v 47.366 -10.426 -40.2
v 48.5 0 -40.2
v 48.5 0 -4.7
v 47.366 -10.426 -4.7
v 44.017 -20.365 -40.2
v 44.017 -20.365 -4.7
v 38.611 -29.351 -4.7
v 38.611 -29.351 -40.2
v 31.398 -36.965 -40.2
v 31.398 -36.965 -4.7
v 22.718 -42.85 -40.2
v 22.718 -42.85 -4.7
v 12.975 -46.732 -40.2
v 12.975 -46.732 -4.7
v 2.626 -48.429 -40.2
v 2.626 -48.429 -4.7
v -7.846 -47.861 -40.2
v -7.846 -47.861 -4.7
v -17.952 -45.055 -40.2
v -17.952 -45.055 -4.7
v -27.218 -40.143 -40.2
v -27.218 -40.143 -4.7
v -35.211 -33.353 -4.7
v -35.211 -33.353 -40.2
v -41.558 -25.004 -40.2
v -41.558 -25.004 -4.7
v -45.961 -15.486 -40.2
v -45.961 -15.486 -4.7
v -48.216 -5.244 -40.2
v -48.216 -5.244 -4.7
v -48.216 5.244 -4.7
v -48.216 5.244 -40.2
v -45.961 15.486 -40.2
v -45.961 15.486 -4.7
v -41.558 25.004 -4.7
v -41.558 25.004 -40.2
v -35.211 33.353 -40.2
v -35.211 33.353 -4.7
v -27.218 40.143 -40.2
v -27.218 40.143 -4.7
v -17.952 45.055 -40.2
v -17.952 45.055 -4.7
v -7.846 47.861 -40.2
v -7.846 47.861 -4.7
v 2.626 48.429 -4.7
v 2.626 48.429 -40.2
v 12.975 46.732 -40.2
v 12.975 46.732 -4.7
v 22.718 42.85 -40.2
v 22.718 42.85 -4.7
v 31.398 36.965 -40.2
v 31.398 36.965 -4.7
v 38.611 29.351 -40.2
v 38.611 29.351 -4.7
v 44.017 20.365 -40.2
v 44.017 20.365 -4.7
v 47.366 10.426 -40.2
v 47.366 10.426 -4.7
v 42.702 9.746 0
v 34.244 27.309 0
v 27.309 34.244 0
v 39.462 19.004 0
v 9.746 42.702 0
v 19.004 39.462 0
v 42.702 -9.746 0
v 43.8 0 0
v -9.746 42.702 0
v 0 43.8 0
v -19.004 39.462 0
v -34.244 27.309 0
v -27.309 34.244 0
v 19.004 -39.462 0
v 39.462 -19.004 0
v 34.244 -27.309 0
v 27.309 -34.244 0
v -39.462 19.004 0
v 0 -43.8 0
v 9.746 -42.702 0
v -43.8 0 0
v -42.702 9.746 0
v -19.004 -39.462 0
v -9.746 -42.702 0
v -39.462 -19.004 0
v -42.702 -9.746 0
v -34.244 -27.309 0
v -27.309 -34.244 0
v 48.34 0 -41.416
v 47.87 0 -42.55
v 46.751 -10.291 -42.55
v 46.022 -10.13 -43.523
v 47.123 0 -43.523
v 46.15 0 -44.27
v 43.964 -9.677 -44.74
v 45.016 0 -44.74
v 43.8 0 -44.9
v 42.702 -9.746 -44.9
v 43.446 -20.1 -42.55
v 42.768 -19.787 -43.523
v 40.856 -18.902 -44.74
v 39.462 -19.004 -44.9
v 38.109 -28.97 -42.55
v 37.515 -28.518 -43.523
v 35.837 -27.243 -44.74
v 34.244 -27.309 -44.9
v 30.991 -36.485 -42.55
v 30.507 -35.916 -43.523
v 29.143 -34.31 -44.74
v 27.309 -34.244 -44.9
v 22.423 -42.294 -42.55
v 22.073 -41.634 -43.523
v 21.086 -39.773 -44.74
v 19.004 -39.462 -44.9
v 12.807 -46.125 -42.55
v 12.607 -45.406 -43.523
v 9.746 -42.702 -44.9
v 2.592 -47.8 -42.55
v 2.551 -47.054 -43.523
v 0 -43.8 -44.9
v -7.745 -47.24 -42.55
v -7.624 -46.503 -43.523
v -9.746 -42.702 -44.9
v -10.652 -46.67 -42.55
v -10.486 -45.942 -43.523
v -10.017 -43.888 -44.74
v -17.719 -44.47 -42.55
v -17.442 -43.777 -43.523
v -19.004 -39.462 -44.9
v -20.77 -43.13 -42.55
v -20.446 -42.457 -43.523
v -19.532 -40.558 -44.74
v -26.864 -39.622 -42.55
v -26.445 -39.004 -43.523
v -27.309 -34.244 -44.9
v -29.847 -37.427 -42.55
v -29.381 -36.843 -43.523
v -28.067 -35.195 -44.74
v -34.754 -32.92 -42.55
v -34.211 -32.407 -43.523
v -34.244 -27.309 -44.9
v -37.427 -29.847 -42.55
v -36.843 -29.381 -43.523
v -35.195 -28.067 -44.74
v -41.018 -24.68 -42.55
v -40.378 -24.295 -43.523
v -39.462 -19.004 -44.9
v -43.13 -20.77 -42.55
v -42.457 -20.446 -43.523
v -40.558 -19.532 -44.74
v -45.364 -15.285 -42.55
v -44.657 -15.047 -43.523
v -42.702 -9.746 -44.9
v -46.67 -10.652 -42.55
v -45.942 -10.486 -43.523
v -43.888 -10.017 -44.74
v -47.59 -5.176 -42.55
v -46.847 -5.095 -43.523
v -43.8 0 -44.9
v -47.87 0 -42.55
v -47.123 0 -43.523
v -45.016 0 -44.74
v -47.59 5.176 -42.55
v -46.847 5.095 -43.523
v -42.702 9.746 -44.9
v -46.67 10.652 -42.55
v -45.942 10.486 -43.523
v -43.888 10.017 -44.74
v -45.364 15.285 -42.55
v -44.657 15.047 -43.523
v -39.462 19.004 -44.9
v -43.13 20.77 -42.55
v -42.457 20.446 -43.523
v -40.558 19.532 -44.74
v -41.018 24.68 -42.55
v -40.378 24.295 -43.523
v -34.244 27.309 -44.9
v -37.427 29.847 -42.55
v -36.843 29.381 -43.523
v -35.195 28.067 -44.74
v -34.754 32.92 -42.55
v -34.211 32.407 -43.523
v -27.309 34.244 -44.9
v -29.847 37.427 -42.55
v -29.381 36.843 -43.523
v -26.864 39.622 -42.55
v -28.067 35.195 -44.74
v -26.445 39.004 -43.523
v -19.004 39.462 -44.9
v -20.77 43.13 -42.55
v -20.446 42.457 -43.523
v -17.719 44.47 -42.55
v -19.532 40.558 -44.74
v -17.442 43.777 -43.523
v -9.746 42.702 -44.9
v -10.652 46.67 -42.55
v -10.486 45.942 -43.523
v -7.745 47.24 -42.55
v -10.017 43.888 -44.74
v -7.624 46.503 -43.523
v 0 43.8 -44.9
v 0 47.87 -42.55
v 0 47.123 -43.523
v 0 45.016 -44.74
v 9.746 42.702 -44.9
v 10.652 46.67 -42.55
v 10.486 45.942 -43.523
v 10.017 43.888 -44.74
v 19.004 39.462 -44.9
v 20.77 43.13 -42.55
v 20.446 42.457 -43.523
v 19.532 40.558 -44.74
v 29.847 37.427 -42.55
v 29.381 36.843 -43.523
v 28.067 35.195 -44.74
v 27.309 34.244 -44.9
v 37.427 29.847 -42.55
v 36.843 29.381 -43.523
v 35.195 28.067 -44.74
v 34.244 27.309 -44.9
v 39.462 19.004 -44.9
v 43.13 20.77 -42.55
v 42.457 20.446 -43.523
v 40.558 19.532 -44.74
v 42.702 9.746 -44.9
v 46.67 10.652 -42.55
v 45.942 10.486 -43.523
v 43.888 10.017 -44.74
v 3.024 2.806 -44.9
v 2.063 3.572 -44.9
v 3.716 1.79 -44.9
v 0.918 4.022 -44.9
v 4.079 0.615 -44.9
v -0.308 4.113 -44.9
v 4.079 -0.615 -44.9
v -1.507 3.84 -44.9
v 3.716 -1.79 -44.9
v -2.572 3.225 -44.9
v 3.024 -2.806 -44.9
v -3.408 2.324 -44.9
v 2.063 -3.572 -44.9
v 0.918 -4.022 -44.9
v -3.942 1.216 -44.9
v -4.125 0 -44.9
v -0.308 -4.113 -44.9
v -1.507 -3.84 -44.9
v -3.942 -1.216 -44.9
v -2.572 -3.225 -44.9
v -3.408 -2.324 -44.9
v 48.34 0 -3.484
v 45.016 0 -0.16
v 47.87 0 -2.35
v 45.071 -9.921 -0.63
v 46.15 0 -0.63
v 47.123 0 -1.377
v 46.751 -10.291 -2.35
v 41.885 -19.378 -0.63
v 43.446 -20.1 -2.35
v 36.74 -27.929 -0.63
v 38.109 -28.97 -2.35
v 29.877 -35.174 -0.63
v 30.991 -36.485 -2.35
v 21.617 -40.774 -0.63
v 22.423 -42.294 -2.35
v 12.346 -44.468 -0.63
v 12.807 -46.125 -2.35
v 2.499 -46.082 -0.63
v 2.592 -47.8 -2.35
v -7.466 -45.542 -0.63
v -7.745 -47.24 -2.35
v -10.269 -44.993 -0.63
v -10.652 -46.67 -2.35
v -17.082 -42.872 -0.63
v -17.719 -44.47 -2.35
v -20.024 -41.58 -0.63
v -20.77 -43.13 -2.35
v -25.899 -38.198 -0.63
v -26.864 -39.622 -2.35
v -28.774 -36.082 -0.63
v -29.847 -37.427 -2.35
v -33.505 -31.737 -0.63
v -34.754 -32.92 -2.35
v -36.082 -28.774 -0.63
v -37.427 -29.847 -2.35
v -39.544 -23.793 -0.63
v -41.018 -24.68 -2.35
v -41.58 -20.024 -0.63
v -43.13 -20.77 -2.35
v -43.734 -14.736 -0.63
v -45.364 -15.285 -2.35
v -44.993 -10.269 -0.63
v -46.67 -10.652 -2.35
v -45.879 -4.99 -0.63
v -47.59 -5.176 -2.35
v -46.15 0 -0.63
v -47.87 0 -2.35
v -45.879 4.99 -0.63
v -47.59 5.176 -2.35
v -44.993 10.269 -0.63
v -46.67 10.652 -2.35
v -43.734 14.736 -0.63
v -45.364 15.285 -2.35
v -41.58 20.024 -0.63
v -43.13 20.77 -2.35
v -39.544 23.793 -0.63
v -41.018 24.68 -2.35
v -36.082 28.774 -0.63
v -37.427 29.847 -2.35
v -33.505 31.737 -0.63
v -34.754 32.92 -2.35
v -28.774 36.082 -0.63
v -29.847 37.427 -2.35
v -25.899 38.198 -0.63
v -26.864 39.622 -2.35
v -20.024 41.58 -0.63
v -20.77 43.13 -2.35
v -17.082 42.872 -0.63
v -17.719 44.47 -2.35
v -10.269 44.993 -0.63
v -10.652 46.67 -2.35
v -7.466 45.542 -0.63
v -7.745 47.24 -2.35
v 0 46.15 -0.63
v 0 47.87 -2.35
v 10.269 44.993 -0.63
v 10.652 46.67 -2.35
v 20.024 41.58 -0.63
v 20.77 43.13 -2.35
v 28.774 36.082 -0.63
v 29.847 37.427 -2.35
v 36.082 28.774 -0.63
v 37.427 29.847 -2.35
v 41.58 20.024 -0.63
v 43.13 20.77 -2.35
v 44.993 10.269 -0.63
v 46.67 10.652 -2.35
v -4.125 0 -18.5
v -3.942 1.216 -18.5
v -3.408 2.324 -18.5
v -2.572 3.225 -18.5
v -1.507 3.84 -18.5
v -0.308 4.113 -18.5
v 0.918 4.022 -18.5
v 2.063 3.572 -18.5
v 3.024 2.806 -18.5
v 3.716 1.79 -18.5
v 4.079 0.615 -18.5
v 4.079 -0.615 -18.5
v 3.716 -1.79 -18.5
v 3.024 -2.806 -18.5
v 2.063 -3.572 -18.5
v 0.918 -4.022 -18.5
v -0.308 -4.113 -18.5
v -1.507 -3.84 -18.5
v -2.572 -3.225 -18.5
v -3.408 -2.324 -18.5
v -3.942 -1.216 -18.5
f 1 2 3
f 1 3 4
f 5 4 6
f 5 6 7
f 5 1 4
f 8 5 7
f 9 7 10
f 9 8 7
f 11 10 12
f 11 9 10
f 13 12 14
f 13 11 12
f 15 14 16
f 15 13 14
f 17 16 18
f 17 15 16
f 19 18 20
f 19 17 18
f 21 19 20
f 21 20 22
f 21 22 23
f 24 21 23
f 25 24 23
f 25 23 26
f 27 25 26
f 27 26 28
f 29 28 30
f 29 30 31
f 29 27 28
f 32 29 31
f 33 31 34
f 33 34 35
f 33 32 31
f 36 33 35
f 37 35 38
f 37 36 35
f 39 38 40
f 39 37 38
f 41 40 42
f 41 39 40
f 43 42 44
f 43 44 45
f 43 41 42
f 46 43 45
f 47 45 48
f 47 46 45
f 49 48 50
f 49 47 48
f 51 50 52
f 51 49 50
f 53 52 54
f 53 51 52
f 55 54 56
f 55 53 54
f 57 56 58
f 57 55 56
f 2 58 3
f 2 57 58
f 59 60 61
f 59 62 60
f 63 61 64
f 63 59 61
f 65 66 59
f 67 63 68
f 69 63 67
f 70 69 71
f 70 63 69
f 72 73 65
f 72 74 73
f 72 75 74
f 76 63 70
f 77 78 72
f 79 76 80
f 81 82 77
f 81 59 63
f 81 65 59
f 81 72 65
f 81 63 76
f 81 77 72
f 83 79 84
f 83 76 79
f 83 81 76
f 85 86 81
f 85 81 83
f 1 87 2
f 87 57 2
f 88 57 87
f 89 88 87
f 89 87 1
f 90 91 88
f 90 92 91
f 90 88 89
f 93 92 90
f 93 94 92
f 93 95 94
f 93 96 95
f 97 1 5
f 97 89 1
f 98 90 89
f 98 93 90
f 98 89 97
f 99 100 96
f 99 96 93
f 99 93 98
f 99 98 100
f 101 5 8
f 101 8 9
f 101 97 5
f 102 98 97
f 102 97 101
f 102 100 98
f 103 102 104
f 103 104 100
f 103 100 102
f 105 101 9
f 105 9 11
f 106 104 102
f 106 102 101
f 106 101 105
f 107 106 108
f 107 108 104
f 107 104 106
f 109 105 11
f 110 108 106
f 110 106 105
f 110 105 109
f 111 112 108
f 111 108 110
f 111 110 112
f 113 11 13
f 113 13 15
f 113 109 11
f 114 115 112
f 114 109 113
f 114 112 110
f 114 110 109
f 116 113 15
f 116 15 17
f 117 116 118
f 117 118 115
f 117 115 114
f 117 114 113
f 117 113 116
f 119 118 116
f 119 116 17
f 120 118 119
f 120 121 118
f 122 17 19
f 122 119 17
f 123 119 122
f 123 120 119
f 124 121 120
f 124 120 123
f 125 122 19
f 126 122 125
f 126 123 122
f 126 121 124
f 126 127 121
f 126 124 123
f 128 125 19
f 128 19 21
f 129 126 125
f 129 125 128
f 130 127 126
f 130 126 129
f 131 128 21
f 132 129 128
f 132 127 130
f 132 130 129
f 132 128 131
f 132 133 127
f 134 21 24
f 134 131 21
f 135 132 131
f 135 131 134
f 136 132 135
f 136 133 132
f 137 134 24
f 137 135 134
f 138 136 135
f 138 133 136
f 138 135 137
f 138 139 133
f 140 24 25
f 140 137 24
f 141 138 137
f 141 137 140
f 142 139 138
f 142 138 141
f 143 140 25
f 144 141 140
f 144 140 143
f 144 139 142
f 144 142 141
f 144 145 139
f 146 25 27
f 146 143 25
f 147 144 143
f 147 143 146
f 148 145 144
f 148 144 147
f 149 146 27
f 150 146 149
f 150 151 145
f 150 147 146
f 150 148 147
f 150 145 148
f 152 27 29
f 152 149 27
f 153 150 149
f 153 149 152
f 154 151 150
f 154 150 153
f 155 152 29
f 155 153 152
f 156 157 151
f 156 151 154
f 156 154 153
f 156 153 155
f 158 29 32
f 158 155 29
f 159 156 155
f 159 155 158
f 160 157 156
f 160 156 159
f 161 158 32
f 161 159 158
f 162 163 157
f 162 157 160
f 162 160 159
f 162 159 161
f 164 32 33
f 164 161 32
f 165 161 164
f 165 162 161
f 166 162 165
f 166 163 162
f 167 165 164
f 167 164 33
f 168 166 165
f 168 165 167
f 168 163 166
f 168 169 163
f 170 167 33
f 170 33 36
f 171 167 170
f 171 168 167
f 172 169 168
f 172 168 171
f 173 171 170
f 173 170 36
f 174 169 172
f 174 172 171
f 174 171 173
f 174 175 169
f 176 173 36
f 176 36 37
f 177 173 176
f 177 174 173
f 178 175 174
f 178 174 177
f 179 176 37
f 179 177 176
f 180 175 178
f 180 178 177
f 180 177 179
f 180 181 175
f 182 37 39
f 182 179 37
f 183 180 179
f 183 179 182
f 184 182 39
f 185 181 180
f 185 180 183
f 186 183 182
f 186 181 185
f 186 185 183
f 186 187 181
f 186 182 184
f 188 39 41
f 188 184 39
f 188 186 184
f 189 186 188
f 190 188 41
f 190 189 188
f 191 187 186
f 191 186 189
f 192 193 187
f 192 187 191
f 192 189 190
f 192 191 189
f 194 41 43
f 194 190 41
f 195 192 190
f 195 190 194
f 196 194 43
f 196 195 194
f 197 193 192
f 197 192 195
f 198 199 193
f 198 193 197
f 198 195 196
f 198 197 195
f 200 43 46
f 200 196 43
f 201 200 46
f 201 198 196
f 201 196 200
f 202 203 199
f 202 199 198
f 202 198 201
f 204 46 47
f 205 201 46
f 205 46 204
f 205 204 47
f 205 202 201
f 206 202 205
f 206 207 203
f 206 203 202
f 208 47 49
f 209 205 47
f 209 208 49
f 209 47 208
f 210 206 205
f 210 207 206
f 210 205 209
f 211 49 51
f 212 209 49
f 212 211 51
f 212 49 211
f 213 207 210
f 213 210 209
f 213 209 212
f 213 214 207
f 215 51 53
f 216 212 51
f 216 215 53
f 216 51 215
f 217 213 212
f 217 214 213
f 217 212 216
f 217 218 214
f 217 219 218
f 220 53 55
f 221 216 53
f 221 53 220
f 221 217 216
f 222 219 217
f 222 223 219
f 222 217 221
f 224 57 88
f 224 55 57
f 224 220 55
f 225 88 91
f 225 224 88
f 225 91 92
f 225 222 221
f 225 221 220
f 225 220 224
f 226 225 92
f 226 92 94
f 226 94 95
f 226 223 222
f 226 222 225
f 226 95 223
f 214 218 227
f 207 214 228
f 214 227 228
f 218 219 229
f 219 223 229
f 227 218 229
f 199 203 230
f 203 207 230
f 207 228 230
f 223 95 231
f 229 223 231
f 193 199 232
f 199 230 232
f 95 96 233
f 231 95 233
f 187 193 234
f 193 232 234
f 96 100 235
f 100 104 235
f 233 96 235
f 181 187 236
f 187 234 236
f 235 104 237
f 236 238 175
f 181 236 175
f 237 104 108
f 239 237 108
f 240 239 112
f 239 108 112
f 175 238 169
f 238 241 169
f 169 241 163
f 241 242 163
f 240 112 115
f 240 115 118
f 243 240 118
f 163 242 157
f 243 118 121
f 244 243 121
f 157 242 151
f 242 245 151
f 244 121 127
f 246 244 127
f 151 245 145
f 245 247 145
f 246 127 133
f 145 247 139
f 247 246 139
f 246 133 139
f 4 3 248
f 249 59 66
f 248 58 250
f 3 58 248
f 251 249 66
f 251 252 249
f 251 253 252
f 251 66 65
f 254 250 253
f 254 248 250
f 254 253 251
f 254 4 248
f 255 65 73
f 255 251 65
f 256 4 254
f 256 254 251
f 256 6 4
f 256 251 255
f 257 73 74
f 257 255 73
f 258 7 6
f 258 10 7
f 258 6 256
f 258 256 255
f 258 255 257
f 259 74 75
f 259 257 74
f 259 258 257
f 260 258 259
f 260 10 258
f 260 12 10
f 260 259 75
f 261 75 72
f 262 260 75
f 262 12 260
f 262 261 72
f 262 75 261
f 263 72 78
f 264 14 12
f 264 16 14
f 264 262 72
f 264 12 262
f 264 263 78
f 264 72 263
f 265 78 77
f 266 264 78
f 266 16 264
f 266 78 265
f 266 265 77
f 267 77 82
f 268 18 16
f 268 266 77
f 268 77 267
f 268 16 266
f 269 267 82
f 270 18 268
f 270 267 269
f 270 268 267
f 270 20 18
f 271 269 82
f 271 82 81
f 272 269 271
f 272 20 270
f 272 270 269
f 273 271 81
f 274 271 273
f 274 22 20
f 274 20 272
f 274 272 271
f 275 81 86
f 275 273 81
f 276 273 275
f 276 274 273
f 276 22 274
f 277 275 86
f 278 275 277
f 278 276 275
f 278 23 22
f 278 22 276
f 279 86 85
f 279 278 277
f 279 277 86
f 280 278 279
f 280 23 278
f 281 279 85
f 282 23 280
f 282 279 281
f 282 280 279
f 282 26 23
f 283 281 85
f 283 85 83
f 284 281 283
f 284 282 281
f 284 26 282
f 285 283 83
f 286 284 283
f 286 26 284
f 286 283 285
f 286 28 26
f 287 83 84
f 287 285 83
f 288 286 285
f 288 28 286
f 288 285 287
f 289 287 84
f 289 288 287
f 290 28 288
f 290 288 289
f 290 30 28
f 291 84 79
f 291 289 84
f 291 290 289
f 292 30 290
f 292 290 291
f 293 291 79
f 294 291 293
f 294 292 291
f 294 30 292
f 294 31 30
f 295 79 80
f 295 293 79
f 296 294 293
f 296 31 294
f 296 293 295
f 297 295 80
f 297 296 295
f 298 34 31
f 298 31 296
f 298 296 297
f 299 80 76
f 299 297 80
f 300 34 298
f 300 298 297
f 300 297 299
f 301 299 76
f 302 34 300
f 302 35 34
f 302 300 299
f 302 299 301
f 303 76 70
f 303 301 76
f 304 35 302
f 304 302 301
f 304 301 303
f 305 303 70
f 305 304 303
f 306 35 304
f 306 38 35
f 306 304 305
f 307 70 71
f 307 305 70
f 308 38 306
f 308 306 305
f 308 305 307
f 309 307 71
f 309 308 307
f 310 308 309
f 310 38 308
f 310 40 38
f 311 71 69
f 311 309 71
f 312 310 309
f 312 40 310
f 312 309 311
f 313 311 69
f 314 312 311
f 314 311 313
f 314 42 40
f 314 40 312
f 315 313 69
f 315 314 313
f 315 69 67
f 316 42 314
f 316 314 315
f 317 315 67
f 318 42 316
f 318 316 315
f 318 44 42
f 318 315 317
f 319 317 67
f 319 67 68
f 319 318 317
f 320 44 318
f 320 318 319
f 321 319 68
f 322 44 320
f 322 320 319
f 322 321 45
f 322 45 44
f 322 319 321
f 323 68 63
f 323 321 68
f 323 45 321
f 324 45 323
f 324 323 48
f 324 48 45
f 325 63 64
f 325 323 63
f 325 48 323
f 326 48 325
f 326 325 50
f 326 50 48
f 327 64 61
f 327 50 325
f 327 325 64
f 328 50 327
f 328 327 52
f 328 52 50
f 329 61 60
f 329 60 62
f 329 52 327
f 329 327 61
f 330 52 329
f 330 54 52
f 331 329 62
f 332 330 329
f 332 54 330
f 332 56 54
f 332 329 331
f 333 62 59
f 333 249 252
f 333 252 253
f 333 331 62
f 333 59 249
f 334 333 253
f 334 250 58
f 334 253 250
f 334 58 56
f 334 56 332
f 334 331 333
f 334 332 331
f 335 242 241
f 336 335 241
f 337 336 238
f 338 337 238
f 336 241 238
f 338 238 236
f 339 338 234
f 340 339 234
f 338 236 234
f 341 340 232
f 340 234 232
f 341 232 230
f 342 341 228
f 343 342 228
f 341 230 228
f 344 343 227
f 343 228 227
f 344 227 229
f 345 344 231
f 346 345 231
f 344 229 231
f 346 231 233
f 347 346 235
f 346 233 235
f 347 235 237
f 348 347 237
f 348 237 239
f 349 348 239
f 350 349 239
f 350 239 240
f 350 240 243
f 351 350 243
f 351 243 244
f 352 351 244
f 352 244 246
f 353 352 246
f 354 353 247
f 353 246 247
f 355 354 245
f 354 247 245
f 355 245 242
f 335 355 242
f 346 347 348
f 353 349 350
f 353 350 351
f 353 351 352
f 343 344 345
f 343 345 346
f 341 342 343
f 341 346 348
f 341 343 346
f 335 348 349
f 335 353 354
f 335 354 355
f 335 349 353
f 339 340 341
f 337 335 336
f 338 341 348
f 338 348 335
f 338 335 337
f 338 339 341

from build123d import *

# Parameters (mm, degrees)
SKETCH1_W          = 48.5
SKETCH1_H          = 44.9
SKETCH2_R          = 4.125
CUT_EXTRUDE1_DEPTH = 26.4
FILLET1_R          = 4.7


with BuildPart() as part:
    # Sketch1 → Revolve1 (revolve)
    with BuildSketch(Plane(origin=(0, 0, 0), x_dir=(1, 0, 0), z_dir=(0, 1, 0))):
        with Locations((24.25, 22.45)):
            Rectangle(SKETCH1_W, SKETCH1_H)
    revolve(axis=Axis((0, 0, 0), (0, 0, -1)))

    # Sketch2 → Cut-Extrude1 (cut)
    with BuildSketch(Plane(origin=(0, 0, -44.9), x_dir=(-1, 0, 0), z_dir=(0, 0, -1))):
        Circle(SKETCH2_R)
    extrude(amount=-CUT_EXTRUDE1_DEPTH, mode=Mode.SUBTRACT)

    # Fillet1
    fillet1_edges = [part.edges().sort_by_distance(p)[0] for p in [
        (-48.5, 0, -44.9),
        (-48.5, 0, 0),
    ]]
    fillet(fillet1_edges, radius=FILLET1_R)


solid = part.part
